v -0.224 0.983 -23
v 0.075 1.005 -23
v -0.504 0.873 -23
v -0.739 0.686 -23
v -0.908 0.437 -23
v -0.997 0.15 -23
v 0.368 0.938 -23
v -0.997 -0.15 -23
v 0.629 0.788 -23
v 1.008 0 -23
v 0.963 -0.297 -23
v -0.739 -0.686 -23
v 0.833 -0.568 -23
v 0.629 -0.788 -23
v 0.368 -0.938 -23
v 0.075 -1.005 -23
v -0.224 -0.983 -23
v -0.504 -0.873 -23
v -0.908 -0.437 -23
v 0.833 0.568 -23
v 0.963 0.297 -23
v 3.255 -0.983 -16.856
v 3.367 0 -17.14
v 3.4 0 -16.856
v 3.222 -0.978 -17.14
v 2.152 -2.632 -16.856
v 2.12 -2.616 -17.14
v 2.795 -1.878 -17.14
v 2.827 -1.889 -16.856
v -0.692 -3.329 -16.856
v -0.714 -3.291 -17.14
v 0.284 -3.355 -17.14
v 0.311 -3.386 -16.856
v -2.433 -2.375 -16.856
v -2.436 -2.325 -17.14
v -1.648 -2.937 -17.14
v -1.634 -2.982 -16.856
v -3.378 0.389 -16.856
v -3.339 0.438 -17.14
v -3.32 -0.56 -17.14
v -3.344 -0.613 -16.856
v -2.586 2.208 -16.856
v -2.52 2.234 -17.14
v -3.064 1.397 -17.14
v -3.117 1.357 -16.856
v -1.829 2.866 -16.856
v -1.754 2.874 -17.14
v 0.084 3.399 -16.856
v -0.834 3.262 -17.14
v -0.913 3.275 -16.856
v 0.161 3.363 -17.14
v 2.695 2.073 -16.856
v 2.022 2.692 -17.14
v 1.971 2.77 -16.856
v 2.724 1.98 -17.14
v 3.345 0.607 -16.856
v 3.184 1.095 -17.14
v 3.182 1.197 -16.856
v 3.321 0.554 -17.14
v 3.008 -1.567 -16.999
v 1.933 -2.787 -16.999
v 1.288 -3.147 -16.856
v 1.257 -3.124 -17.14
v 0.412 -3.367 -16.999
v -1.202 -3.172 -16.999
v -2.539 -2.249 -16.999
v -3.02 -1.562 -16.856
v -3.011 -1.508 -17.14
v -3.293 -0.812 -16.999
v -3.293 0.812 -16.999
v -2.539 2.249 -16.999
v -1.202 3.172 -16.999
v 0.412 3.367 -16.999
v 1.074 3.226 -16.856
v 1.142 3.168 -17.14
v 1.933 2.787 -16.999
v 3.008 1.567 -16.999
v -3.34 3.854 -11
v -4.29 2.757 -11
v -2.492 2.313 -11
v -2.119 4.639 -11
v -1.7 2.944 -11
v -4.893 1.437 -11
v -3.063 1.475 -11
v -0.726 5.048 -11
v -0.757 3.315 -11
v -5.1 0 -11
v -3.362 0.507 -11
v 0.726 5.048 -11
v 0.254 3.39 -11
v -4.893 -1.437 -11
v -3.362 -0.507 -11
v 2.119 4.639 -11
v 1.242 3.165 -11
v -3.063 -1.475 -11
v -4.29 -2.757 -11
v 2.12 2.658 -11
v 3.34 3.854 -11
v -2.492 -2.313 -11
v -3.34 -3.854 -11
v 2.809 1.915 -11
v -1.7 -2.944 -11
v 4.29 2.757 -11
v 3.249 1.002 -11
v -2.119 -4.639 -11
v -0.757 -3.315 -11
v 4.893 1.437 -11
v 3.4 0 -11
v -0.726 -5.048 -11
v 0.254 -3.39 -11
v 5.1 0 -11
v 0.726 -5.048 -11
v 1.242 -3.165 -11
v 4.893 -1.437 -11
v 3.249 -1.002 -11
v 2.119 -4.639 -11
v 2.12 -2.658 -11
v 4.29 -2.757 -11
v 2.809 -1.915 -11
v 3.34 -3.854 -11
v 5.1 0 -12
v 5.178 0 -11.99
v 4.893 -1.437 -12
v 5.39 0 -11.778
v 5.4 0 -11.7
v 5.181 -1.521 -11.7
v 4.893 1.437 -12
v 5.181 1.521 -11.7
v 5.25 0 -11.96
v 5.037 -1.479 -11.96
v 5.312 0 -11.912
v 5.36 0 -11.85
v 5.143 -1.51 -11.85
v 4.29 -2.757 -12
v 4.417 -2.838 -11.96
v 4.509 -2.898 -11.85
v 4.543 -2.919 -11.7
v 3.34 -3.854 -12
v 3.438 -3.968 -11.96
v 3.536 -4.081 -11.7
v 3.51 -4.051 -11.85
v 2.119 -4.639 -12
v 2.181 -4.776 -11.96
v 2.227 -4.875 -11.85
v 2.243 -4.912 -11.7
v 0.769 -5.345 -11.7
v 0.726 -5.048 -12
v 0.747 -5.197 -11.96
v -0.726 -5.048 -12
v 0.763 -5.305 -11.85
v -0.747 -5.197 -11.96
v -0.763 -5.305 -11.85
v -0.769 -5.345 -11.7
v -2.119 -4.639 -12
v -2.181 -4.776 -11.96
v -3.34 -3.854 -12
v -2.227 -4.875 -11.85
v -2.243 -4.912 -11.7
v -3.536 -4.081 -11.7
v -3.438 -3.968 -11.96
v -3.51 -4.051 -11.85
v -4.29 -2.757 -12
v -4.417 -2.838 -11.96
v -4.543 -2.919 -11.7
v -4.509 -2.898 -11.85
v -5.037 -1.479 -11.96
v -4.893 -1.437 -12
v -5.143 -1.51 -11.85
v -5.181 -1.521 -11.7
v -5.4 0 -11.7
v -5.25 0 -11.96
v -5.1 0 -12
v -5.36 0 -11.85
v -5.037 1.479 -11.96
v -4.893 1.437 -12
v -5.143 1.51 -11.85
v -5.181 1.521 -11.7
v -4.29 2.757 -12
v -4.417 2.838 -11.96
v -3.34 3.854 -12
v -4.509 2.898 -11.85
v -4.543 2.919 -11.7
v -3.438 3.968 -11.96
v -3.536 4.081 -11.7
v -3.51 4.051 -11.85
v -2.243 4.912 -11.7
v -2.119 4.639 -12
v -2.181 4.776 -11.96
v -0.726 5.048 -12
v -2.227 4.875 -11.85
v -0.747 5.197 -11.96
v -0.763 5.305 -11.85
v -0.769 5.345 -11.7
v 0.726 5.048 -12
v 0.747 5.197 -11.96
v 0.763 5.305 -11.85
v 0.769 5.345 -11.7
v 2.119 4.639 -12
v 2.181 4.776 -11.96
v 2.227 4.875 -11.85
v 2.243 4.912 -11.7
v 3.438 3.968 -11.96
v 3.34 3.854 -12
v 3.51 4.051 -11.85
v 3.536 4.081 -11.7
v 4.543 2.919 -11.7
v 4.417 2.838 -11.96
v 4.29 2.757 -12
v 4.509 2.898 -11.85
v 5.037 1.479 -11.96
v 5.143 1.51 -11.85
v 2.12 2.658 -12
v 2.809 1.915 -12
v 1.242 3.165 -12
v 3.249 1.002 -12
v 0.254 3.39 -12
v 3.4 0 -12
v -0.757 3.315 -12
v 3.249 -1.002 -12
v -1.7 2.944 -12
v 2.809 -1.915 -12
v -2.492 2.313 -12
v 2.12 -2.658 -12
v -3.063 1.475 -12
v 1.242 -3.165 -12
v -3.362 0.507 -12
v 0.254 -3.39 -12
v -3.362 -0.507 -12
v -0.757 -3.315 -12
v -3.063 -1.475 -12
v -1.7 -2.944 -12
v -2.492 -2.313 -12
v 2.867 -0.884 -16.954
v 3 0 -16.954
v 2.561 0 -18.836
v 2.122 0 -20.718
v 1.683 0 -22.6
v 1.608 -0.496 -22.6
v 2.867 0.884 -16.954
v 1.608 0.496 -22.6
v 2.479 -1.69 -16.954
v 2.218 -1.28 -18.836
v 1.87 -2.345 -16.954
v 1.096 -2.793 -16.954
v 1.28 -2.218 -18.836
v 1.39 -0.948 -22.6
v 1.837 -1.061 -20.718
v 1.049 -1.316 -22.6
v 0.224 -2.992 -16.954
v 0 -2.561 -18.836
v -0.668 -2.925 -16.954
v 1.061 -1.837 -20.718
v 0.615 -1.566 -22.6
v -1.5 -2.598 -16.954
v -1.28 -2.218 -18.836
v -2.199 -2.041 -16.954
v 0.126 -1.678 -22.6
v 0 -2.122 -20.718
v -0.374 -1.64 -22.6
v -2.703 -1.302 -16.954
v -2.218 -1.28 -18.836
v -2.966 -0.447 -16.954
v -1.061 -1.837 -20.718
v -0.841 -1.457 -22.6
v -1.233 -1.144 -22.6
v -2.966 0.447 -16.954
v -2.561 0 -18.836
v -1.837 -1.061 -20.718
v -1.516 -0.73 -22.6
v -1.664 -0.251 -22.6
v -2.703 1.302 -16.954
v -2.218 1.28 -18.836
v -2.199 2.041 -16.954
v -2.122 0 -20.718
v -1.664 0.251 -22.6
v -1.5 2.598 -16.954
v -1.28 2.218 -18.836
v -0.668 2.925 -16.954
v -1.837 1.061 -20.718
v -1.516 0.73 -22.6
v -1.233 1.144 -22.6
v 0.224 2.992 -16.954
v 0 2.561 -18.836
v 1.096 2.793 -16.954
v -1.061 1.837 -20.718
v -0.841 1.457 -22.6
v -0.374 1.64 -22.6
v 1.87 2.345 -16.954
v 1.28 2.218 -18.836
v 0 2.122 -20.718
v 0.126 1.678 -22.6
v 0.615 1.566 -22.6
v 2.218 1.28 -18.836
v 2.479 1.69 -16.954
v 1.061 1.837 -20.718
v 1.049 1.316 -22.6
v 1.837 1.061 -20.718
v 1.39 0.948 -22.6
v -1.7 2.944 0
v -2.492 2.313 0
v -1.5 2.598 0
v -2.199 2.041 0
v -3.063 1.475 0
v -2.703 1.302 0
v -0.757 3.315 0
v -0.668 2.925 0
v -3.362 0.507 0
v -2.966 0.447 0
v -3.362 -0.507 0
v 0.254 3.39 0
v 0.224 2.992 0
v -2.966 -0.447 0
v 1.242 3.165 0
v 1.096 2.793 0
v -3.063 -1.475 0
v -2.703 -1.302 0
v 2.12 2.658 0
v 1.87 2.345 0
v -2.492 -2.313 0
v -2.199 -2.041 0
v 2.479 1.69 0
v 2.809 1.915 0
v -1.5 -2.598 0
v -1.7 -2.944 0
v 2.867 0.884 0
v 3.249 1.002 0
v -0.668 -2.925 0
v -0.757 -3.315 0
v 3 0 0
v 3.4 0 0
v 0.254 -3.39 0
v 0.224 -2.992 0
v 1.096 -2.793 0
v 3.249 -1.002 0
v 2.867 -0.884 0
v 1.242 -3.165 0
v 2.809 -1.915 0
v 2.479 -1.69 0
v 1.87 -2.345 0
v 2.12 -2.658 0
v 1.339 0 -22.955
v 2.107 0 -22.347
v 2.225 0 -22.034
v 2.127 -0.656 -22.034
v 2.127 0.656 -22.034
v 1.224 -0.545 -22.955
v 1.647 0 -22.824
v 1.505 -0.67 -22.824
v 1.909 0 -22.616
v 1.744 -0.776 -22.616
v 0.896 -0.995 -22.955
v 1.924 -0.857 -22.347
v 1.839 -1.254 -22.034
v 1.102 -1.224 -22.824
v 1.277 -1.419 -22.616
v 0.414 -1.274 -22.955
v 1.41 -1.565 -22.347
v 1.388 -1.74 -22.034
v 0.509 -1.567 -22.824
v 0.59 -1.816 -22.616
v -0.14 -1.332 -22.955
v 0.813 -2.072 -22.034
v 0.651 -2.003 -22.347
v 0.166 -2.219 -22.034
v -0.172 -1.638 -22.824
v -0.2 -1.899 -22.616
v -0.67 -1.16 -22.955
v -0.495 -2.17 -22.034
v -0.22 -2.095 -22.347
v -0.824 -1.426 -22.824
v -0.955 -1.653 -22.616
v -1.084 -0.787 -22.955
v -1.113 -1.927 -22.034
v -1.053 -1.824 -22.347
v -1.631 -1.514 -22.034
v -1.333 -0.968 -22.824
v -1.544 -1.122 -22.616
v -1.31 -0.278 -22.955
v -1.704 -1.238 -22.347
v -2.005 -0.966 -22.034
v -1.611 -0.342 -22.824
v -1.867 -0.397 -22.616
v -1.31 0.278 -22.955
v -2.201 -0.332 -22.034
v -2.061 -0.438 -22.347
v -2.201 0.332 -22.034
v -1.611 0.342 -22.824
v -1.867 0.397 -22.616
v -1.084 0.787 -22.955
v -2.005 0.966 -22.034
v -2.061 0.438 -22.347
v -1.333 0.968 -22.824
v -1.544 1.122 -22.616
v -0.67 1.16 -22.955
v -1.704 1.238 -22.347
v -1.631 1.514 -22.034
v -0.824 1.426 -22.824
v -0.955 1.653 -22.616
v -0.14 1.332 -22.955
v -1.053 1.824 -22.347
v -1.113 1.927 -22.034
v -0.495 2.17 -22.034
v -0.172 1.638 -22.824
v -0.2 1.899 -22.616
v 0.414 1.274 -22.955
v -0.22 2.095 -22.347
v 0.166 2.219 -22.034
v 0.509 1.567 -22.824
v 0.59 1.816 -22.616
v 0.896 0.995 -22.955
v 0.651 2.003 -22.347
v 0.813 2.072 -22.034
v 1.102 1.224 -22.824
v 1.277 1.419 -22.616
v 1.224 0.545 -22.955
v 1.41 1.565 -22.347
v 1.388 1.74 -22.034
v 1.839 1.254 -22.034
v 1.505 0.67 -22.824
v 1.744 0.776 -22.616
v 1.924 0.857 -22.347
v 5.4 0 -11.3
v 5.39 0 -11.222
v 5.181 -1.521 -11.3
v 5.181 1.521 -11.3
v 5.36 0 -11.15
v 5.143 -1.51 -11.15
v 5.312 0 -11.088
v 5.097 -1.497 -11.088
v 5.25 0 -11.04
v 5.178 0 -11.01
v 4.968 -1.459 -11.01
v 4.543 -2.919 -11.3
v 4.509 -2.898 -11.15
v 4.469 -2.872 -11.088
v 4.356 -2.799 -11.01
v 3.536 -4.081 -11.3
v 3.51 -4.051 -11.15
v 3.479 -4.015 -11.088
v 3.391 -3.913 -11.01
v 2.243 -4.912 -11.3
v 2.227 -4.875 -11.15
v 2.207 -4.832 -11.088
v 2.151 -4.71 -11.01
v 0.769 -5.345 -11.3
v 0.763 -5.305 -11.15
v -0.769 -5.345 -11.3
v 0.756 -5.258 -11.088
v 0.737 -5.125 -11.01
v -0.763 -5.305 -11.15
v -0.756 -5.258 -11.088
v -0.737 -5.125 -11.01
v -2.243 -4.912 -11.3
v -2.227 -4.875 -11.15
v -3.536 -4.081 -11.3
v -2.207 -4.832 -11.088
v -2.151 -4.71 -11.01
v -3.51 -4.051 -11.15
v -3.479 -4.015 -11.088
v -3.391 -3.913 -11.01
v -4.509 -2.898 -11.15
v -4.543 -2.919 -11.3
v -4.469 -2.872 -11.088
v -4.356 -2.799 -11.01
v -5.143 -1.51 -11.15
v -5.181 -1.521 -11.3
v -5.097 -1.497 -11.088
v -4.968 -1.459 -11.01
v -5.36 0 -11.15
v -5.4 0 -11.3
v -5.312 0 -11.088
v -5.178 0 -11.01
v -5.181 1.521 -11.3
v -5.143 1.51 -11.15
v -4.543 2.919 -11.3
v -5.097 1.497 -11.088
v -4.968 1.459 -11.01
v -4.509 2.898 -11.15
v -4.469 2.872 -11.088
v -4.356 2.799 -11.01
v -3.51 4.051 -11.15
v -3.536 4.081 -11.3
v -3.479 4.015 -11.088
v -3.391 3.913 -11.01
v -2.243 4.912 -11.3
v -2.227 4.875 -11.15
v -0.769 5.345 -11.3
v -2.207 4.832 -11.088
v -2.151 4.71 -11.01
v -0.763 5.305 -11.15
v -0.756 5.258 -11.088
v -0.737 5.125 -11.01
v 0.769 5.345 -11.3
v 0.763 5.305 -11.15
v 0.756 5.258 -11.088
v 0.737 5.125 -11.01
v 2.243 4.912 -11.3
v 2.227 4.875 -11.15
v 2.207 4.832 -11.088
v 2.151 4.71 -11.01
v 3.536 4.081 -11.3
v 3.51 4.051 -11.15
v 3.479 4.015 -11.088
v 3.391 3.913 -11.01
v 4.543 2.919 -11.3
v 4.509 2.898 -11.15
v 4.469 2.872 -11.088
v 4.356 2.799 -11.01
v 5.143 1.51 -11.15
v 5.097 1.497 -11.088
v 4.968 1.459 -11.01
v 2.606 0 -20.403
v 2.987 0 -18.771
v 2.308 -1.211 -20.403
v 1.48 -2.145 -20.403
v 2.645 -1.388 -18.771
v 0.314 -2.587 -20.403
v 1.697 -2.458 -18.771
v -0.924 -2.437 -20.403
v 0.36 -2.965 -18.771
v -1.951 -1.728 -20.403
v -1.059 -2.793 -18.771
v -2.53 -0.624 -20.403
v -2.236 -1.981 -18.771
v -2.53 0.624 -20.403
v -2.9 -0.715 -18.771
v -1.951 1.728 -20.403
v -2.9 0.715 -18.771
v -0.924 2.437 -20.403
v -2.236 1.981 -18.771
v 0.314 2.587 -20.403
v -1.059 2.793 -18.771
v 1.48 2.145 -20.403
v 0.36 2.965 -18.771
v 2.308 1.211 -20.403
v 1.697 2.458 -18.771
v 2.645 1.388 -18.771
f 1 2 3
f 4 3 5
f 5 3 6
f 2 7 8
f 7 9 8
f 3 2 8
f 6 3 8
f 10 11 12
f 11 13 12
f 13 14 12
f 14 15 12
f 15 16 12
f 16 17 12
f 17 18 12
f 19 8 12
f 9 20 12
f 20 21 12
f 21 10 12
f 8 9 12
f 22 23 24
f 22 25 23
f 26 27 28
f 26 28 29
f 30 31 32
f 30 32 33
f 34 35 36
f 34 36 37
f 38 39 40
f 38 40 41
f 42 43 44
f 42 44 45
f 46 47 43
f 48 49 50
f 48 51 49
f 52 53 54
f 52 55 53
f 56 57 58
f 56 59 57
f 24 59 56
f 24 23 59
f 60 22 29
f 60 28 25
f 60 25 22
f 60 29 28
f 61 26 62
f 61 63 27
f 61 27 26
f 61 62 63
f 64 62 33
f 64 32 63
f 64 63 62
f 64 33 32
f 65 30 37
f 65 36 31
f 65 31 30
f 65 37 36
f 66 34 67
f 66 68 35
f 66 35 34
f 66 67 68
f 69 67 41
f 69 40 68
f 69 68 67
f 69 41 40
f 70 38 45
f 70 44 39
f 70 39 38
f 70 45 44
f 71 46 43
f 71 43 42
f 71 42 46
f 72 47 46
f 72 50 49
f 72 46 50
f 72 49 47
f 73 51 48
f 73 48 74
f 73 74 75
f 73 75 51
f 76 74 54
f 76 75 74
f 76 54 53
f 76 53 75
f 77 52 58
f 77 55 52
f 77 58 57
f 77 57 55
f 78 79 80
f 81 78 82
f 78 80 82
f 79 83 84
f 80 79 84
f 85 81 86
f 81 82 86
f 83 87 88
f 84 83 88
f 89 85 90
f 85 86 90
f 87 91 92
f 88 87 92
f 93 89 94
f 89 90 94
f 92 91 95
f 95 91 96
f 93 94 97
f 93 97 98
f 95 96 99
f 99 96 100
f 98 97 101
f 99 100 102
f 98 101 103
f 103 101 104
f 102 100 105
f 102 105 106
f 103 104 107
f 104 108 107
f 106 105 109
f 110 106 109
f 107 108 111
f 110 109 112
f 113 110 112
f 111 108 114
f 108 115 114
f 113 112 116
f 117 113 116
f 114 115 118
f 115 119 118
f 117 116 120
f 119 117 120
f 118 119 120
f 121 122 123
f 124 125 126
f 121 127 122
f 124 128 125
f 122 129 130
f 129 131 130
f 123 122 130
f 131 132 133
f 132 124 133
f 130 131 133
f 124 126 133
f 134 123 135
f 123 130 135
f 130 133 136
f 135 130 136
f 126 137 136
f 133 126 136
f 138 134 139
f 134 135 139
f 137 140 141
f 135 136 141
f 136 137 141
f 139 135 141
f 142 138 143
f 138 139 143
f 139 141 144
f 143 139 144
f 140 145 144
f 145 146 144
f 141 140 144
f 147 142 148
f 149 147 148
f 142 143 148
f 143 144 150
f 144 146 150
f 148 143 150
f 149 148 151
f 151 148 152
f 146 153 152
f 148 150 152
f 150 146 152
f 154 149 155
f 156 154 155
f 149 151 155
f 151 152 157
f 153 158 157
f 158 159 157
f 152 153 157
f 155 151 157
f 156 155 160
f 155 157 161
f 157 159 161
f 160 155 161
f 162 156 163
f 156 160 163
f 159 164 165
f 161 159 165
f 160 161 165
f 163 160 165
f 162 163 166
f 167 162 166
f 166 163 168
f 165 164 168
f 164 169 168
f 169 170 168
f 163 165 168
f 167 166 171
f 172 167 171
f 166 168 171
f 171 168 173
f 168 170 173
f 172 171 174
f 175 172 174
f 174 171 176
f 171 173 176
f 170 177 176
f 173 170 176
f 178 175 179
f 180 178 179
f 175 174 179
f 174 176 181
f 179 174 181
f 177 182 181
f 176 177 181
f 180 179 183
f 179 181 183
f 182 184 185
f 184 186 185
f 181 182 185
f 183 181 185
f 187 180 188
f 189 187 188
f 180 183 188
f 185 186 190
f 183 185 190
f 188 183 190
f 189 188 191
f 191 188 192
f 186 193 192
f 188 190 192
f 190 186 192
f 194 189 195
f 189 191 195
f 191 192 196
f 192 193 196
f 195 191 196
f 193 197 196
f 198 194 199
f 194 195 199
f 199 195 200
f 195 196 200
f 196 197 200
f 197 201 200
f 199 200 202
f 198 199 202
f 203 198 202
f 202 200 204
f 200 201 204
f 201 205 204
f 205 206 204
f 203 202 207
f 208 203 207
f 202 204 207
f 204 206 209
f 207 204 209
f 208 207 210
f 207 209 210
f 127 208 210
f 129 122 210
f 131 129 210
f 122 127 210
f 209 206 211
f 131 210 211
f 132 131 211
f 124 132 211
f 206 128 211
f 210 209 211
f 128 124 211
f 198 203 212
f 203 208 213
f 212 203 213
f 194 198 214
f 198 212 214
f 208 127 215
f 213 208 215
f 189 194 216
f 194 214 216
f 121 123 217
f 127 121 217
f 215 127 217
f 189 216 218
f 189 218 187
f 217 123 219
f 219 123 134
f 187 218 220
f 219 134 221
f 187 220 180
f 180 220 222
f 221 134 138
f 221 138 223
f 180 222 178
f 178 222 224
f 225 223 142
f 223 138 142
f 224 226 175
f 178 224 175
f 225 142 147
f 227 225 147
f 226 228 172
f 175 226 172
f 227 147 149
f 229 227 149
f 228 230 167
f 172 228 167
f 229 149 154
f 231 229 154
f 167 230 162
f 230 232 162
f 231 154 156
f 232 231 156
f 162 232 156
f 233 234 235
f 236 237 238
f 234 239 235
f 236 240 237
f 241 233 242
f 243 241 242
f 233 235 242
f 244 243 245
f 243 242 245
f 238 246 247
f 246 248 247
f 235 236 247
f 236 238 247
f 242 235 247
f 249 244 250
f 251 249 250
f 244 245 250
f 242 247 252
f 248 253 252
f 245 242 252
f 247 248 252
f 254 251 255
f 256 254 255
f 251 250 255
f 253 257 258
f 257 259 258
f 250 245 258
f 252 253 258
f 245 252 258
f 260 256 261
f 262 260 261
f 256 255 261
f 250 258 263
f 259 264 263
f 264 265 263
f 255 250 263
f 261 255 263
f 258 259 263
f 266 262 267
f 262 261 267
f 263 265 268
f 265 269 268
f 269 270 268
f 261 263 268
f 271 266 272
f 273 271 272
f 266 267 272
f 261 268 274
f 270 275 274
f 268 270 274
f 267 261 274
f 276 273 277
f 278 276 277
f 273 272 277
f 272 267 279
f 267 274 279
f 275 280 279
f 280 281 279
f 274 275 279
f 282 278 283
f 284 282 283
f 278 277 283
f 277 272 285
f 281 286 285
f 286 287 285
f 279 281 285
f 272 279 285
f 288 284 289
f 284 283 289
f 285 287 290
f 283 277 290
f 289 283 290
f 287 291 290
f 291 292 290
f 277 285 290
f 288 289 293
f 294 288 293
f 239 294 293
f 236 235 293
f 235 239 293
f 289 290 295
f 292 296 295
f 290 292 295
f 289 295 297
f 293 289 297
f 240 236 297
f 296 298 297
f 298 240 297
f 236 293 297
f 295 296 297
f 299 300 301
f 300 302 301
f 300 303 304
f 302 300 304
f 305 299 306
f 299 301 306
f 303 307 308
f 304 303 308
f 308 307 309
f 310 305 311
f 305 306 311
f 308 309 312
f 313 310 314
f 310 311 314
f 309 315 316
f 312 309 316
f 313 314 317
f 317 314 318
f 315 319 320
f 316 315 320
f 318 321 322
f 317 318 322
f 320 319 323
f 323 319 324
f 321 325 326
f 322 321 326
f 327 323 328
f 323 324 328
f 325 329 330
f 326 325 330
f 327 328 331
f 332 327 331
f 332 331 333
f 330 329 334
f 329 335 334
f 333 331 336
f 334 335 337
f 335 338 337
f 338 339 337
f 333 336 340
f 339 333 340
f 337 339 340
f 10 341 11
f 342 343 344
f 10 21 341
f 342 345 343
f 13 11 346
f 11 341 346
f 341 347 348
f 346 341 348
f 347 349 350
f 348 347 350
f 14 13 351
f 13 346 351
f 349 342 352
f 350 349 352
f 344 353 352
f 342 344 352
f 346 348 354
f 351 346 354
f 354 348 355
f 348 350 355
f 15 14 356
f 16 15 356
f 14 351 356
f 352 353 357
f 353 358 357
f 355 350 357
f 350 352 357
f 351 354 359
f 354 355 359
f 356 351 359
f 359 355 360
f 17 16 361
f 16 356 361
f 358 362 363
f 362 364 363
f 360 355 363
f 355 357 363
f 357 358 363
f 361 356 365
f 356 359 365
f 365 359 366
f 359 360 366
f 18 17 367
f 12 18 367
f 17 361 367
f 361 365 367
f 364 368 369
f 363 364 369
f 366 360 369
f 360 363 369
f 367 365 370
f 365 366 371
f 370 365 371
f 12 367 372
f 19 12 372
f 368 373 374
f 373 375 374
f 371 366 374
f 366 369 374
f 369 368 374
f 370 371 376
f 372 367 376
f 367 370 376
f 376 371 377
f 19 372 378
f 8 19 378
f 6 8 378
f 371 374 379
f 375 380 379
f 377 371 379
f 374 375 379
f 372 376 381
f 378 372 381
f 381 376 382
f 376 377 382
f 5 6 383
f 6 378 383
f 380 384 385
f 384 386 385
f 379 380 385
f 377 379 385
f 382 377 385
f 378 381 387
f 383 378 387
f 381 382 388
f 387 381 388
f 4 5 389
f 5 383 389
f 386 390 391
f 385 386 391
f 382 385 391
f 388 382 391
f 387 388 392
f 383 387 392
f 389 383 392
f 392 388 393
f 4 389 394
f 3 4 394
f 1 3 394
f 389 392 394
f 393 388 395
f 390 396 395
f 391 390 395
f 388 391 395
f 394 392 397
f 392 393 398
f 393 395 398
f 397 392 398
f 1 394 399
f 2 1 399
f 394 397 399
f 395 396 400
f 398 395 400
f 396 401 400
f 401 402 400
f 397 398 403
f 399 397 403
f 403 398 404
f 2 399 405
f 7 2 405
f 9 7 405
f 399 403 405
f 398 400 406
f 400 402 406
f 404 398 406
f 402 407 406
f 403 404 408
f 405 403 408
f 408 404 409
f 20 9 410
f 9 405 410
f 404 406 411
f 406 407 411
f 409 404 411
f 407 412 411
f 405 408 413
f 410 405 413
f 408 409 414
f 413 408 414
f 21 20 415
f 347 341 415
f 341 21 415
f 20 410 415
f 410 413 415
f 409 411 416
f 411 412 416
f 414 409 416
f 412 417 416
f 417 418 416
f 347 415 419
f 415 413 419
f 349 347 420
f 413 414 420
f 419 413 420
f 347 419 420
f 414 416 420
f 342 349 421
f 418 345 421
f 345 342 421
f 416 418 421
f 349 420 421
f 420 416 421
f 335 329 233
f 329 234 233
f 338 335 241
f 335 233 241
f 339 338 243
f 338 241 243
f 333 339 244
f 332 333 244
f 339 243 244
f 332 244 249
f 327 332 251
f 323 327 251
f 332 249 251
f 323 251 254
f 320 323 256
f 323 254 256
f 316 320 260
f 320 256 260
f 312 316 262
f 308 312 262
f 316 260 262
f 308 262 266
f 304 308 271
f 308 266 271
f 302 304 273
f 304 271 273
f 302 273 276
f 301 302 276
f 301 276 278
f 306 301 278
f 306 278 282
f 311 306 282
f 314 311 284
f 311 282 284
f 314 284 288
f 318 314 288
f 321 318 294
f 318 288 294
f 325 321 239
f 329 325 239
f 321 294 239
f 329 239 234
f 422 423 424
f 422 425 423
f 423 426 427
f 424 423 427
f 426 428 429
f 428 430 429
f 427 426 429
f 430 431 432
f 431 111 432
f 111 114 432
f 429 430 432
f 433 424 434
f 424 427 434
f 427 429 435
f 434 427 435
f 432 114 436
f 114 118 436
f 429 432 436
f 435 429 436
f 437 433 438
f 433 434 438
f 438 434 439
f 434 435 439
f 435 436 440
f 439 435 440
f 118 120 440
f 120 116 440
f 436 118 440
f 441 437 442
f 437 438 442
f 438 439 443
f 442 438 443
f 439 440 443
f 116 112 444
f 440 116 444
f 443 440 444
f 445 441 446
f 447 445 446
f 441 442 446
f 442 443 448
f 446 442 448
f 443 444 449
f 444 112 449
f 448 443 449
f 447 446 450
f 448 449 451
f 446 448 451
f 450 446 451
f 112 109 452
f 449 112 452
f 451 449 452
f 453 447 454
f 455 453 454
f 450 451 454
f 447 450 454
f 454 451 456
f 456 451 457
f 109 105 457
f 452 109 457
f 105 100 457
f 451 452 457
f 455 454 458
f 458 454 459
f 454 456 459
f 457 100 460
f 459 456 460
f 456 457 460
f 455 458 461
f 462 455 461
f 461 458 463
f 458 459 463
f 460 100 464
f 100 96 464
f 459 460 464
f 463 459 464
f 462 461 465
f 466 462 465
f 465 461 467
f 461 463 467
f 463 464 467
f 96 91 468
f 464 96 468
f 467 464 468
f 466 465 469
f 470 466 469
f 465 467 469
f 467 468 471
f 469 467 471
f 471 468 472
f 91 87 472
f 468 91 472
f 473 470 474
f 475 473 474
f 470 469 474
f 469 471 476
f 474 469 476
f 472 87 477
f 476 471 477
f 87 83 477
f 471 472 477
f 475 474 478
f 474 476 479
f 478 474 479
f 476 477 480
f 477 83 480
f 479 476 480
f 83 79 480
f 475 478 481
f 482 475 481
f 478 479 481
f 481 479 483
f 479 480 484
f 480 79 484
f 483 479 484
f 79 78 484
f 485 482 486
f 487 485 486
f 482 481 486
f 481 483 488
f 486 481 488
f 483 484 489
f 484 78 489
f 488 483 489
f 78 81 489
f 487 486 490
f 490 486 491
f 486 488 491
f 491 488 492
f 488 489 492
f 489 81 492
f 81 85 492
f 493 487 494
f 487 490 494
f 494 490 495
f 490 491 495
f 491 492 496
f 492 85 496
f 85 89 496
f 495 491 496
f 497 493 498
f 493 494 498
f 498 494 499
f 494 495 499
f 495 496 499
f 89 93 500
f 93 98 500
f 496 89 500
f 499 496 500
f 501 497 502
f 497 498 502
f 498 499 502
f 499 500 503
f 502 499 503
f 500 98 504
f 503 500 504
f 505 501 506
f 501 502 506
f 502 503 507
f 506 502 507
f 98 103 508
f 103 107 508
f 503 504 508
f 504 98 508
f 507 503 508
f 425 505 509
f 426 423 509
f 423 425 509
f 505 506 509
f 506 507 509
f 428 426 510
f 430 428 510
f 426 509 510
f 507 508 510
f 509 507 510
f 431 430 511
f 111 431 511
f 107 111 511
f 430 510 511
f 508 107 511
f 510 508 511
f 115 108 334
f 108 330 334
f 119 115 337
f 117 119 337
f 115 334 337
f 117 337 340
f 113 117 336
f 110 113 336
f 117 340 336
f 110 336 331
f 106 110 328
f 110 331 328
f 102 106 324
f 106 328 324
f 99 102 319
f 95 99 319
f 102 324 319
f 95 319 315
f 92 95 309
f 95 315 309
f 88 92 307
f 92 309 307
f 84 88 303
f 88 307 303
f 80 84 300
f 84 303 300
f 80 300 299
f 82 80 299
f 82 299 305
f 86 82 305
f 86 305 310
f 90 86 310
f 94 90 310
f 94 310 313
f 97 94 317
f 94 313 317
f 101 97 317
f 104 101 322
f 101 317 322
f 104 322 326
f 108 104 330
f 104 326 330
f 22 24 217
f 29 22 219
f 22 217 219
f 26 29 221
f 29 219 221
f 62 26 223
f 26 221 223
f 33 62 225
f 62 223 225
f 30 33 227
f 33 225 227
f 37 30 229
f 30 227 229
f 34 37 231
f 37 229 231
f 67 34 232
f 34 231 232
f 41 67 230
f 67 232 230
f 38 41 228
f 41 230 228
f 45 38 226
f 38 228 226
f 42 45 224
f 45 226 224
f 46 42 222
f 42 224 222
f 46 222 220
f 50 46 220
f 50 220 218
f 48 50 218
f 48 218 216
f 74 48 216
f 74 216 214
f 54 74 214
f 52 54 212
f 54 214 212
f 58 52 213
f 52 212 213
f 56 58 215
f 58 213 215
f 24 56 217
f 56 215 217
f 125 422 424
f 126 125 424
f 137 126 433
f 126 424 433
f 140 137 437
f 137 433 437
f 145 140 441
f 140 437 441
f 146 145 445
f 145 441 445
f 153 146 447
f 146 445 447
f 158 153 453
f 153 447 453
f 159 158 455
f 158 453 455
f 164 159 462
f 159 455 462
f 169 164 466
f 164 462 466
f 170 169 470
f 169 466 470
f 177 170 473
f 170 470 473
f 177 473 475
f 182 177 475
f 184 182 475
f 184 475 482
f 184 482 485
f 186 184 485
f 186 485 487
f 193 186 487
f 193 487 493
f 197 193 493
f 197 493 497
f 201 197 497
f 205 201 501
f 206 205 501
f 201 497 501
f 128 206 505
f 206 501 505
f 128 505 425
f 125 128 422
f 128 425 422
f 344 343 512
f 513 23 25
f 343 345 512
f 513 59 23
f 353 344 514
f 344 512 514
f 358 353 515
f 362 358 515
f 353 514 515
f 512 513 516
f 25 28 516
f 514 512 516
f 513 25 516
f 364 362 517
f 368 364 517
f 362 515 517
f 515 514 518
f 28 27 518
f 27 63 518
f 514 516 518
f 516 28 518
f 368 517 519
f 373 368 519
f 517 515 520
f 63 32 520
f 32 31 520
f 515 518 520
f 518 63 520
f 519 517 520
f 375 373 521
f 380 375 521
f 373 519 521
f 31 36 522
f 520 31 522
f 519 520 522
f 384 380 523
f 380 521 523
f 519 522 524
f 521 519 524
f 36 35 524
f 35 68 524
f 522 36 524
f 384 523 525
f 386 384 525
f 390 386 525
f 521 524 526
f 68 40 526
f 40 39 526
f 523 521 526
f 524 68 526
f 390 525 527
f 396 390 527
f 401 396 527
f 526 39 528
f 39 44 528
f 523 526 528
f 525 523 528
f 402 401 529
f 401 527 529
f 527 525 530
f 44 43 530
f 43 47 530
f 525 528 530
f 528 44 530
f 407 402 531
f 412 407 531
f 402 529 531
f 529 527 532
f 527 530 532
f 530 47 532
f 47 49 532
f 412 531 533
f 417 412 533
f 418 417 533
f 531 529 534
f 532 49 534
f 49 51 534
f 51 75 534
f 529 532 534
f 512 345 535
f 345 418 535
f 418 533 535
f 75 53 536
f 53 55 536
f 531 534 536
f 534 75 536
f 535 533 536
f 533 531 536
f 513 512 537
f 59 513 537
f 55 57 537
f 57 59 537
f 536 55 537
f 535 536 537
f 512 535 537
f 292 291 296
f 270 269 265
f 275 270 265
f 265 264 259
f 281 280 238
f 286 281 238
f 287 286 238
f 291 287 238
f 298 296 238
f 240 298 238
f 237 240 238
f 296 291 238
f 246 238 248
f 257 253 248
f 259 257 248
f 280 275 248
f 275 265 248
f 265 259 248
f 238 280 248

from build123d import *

# Parameters (mm, degrees)
F2_R = 1.25
F3_R = 0.3


with BuildPart() as f1:
    # F0 (on Front) → F1 (revolve)
    with BuildSketch(Plane.XZ):
        Polygon((0, -22.6), (0, -23), (2, -23), (3.4, -17), (3.4, -12), (5.4, -12), (5.4, -11), (3.4, -11), (3.4, 0), (3, 0), (3, -16.953952), (1.682589, -22.6), align=None)
    revolve(axis=Axis((0, 0, -11.5), (0, 0, -1)))

    # F2
    f2_edges = [f1.edges().sort_by_distance(p)[0] for p in [
        (-2, 0, -23),
        (-3.4, 0, -17),
    ]]
    fillet(f2_edges, radius=F2_R)

    # F3
    f3_edges = [f1.edges().sort_by_distance(p)[0] for p in [
        (-5.4, 0, -11),
        (-5.4, 0, -12),
    ]]
    fillet(f3_edges, radius=F3_R)


solid = f1.part
